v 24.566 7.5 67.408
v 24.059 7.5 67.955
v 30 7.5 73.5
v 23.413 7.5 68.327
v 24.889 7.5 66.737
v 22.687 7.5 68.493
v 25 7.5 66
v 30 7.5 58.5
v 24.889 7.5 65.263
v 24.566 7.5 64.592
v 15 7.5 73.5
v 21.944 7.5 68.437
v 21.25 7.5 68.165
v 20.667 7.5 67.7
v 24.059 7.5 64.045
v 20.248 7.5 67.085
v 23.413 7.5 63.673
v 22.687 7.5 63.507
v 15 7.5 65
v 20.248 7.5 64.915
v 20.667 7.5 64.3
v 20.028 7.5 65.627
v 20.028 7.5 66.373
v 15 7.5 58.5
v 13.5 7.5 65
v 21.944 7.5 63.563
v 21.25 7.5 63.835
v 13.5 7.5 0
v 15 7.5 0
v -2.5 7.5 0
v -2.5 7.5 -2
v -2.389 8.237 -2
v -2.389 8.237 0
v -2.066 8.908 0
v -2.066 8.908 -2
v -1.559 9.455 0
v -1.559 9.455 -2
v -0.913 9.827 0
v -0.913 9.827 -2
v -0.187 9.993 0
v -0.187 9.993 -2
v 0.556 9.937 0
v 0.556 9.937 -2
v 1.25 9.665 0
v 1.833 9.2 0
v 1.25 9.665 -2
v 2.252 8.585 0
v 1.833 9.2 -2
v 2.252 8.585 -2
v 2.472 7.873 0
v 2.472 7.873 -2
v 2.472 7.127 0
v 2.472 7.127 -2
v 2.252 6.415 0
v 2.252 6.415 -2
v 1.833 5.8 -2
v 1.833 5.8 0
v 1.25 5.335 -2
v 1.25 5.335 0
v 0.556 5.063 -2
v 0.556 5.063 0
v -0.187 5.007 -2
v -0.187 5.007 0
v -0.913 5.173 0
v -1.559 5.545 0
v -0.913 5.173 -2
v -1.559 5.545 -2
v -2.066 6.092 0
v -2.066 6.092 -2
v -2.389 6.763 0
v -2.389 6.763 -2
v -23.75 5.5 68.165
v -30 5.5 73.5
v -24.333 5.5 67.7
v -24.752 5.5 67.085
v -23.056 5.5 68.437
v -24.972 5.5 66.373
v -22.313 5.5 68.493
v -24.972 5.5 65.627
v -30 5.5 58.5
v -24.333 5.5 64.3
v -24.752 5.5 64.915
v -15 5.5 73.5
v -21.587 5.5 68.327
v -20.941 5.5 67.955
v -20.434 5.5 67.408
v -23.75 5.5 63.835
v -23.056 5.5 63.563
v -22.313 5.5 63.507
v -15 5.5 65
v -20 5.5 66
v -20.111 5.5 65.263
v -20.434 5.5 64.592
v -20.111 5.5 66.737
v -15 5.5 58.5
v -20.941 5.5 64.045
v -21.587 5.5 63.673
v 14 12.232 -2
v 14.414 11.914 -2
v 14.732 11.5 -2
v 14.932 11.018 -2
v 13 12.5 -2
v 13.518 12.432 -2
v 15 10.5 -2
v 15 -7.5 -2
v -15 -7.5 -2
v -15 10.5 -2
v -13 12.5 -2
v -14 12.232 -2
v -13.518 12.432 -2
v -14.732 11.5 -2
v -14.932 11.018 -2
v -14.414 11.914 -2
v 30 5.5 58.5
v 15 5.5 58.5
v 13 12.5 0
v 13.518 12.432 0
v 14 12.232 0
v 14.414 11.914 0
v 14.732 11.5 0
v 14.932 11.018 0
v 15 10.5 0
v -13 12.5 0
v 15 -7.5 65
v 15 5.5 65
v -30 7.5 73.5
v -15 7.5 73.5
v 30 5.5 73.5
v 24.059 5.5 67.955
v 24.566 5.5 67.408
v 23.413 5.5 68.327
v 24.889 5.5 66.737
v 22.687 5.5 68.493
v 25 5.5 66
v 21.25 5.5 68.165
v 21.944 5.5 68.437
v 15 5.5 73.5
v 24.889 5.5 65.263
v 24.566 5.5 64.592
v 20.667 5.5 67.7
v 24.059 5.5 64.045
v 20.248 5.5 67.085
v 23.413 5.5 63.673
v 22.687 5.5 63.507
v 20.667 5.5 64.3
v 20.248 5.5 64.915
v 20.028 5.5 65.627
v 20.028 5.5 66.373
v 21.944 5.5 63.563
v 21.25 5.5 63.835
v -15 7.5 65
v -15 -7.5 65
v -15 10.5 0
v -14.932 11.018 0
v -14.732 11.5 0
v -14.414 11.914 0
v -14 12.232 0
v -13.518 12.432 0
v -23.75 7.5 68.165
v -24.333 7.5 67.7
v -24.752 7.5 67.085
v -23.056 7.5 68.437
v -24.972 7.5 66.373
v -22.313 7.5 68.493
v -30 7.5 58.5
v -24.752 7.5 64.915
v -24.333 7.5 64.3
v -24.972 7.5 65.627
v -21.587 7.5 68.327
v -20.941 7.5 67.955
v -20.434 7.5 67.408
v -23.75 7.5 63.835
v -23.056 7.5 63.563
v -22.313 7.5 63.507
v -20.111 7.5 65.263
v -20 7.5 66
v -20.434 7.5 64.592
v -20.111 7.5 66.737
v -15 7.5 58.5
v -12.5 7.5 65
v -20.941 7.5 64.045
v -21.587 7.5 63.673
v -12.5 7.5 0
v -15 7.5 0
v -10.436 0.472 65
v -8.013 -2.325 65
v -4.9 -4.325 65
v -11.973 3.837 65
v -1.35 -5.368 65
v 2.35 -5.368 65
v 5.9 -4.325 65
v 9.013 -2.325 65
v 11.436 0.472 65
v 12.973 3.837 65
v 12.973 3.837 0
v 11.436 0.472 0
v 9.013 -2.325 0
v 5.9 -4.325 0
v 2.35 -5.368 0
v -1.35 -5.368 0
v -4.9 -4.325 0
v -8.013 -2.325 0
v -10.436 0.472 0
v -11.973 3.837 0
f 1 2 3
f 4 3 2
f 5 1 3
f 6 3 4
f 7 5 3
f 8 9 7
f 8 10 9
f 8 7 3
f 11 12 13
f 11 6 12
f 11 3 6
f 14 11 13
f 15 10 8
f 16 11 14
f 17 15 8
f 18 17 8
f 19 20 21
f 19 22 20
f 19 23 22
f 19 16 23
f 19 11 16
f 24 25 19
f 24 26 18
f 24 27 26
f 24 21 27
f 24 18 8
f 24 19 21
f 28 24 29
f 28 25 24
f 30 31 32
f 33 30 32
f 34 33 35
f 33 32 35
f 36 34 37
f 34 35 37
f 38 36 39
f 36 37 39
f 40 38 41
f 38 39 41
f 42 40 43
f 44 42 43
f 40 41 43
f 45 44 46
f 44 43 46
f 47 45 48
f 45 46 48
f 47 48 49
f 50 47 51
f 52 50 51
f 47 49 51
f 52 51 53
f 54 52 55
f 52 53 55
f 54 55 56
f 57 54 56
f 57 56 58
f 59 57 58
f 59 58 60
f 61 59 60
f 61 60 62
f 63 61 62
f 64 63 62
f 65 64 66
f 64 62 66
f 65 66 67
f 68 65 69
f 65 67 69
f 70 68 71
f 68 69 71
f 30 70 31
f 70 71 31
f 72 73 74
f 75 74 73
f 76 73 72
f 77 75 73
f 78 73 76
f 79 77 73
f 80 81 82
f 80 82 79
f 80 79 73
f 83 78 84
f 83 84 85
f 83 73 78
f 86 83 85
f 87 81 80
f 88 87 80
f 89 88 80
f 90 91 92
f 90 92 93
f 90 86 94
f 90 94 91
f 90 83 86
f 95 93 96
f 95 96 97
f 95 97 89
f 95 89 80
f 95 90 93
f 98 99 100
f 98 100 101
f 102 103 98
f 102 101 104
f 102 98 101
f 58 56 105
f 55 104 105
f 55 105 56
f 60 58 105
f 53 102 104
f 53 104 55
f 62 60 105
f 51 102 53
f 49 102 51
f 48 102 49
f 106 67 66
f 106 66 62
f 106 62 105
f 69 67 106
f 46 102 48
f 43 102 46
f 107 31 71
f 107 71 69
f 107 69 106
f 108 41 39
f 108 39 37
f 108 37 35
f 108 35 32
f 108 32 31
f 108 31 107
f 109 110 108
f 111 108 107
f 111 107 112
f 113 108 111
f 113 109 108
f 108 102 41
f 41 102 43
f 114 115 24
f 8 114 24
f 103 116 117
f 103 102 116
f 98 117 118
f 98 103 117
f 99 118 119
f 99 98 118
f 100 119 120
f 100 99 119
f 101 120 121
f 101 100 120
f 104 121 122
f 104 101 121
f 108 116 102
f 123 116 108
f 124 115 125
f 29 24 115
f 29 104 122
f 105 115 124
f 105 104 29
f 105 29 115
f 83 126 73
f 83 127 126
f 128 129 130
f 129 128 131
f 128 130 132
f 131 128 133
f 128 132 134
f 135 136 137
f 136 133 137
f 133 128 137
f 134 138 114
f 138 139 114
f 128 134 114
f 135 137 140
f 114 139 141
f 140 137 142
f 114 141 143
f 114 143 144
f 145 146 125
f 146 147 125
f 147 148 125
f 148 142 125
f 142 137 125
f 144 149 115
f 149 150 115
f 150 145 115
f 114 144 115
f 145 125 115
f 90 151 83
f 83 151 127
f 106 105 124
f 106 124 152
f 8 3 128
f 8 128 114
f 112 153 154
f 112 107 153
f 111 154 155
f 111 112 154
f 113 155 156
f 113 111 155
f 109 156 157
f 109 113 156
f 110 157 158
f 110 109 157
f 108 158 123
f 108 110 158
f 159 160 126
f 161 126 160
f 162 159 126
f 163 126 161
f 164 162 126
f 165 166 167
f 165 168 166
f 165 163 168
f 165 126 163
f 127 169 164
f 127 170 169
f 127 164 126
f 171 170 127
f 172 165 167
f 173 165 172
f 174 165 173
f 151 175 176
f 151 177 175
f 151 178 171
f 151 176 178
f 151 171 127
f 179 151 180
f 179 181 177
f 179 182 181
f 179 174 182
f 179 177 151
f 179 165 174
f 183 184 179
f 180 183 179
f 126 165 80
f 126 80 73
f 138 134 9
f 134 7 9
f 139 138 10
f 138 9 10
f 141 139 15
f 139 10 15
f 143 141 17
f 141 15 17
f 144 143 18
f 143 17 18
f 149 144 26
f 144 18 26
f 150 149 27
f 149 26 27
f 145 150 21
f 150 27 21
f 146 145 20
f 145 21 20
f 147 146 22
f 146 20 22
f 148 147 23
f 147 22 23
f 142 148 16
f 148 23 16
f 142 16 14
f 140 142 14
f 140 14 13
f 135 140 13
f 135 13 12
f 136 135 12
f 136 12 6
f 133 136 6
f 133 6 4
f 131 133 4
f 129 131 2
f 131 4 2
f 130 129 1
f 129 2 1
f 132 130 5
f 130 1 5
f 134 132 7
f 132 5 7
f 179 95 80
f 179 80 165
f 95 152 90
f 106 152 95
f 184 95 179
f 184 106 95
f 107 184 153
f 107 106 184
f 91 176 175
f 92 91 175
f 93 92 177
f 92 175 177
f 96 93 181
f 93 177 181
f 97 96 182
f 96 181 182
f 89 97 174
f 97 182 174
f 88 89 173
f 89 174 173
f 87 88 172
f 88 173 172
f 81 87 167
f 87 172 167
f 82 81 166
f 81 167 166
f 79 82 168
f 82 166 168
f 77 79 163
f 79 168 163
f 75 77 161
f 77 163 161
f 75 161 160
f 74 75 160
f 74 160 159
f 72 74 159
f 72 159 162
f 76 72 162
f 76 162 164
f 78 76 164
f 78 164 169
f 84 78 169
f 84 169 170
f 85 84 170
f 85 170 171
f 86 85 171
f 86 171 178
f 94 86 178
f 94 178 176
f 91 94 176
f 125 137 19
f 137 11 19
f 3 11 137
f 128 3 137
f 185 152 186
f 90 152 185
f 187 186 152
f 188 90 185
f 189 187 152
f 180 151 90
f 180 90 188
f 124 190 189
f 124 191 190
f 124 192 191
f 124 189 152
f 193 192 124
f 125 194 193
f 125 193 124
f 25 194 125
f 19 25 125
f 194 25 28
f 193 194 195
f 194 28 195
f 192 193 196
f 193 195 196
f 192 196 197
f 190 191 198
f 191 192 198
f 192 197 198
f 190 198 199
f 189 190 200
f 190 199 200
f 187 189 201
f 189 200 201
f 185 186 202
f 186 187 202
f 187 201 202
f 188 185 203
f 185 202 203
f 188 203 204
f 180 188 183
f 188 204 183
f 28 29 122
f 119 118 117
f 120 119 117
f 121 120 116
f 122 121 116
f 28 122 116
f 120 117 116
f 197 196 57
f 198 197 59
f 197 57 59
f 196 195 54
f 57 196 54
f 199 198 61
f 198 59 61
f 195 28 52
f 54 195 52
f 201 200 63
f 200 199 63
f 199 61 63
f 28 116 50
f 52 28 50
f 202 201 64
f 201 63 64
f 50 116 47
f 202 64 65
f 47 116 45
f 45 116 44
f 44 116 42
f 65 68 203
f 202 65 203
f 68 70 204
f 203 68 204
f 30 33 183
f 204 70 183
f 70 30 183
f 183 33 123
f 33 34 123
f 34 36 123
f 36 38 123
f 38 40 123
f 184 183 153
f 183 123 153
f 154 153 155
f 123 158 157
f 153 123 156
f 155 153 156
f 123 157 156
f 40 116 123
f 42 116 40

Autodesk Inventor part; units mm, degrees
ref_plane "YZ Plane" through (0, 0, 0) normal (1, 0, 0) x (0, 1, 0)
ref_plane "XZ Plane" through (0, 0, 0) normal (0, 1, 0) x (-1, 0, 0)
ref_plane "XY Plane" through (0, 0, 0) normal (0, 0, 1) x (1, 0, 0)
sketch "Skizze1" plane through (0, 0, 0) normal (0, 0, 1) x (1, 0, 0)
  line L0 (15, 7.5) -> (15, -7.5)
  line L1 (15, -7.5) -> (-15, -7.5)
  line L2 (-15, -7.5) -> (-15, 7.5)
  line L3 (-15, 7.5) -> (15, -7.5) construction
  line L4 (15, 7.5) -> (-15, -7.5) construction
  arc A0 (-12.5, 7.5) -> (13.5, 7.5) centre (0.5, 7.5) ccw
  line L5 (-15, 7.5) -> (-12.5, 7.5)
  line L6 (13.5, 7.5) -> (15, 7.5)
  point P0 (0, 0)
  dimension "d0" = 30
  dimension "d1" = 15
  dimension "d2" = 26
extrude "Extrusion1" add sketch "Skizze1" along normal blind 65
sketch "Skizze2" plane through (0, 0, 65) normal (0, 0, 1) x (1, 0, 0)
  line L0 (-15, 7.5) -> (-15, -7.5) projected
  line L1 (15, 7.5) -> (13.5, 7.5) projected
  line L2 (-15, -7.5) -> (15, -7.5)
  line L3 (15, -7.5) -> (15, 7.5)
  line L4 (-15, 7.5) -> (-15, -7.5)
  arc A0 (-12.5, 7.5) -> (13.5, 7.5) centre (0.5, 7.5) ccw projected
  arc A1 (0, -5.4904) -> (13.5, 7.5) centre (0.5, 7.5) ccw
  arc A2 (-12.5, 7.5) -> (0, -5.4904) centre (0.5, 7.5) ccw
  point P0 (0, 0)
extrude "Extrusion2" [suppressed]
sketch "Skizze3" plane through (0, 0, 67) normal (0, 0, 1) x (1, 0, 0)
  line L0 (-15, 7.5) -> (-15, -7.5) projected
  line L1 (-15, -7.5) -> (15.179, -7.5)
  line L2 (15.179, -7.5) -> (15.179, 7.5)
  line L3 (15.179, 7.5) -> (-15, 7.5)
  line L4 (-15, 7.5) -> (-15, -7.5)
  arc A0 (-12.9105, 7.5) -> (13.0895, 7.5) centre (0.0895, 7.5) ccw
  point P0 (0, 0)
  dimension "d7" = 26
extrude "Extrusion3" [suppressed]
sketch "Skizze4" plane through (0, 0, 132) normal (0, 0, 1) x (1, 0, 0)
  line L0 (-15, 7.5) -> (-15, -7.5) projected
  line L1 (-15, -7.5) -> (15, -7.5)
  line L2 (15, -7.5) -> (15, 12.5)
  line L3 (15, 12.5) -> (-15, 12.5)
  line L4 (-15, 12.5) -> (-15, -7.5)
  point P0 (0, 0)
  dimension "d10" = 30
  dimension "d11" = 20
extrude "Extrusion4" [suppressed]
sketch "Skizze5" plane through (0, 0, 134) normal (0, 0, 1) x (1, 0, 0)
  circle A0 centre (0, 7.5) radius 2.5
  point P0 (0, 0)
  dimension "d14" = 5
extrude "Extrusion5" [suppressed]
sketch "Skizze6" plane through (0, 0, 0) normal (0, 0, -1) x (-1, 0, 0)
  line L0 (-15.179, -7.5) -> (-15, -7.5) projected
  line L1 (-15, 12.5) -> (15, 12.5) projected
  line L2 (-15, -7.5) -> (15, -7.5)
  line L3 (15, -7.5) -> (15, 12.5)
  line L4 (15, 12.5) -> (-15, 12.5)
  line L5 (-15, 12.5) -> (-15, -7.5)
  point P0 (0, 0)
  point P1 (-14.9426, -7.5)
extrude "Extrusion6" add sketch "Skizze6" along normal blind 2
sketch "Skizze7" plane through (0, 0, -2) normal (0, 0, -1) x (-1, 0, 0)
  line L0 (-13.0895, 7.5) -> (12.9105, 7.5) projected
  circle A0 centre (0, 7.5) radius 2.5
  point P0 (0, 0)
  dimension "d19" = 5
extrude "Extrusion7" cut sketch "Skizze7" against normal blind 2
fillet "Rundung1" radius 2 1 edges at (-15, 12.5, -1)
fillet "Rundung2" [suppressed]
fillet "Rundung3" [suppressed]
fillet "Rundung4" radius 2 1 edges at (15, 12.5, -1)
sketch "Skizze8" plane through (-15, -7.5, -2) normal (-1, 0, 0) x (0, 0, 1)
  line L0 (69, 0) -> (69, 15) projected
  line L1 (69, 15) -> (68, 15)
  line L2 (75.5, 13) -> (60.5, 13)
  line L3 (60.5, 13) -> (60.5, 15)
  line L4 (75.5, 15) -> (75.5, 13)
  line L5 (75.5, 13) -> (60.5, 17) construction
  line L6 (60.5, 13) -> (68, 15) construction
  line L7 (2, 15) -> (67, 15) projected
  line L8 (60.5, 15) -> (75.5, 15)
  point P0 (2, 7.5)
  dimension "d26" = 1
  dimension "d28" = 4
extrude "Extrusion8" add sketch "Skizze8" along normal blind 15
sketch "Skizze9" plane through (-12.5, 7.5, 65) normal (0, 1, 0) x (1, 0, 0)
  line L0 (-2.5, 6.5) -> (-17.5, 6.5) projected
  line L1 (-2.5, 67) -> (-2.5, 0) projected
  line L2 (-17.5, 6.5) -> (3.7132, 6.5) construction
  circle A0 centre (-10, -1) radius 2.5
  point P0 (12.5, 65)
  point P1 (-2.5, -69)
  dimension "d32" = 5
extrude "Extrusion9" cut sketch "Skizze9" against normal through all
sketch "Skizze10" plane through (15, -7.5, 67) normal (1, 0, 0) x (0, 0, -1)
  line L0 (0, 15) -> (1, 15)
  line L1 (67, 15) -> (2, 15) projected
  line L2 (8.5, 17) -> (-6.5, 17)
  line L3 (-6.5, 15) -> (-6.5, 13)
  line L4 (-6.5, 13) -> (8.5, 13)
  line L5 (8.5, 13) -> (8.5, 15)
  line L6 (1, 15) -> (-6.5, 13) construction
  line L7 (1, 15) -> (8.5, 13) construction
  line L8 (0, 15) -> (-65, 15) projected
  line L9 (-6.5, 15) -> (8.5, 15)
  point P0 (67, 7.5)
  point P1 (8.5, 15)
  point P2 (1, 15)
  dimension "d35" = 1
  dimension "d37" = 4
extrude "Extrusion10" add sketch "Skizze10" along normal blind 15
sketch "Skizze11" plane through (-12.5, 7.5, 65) normal (0, 1, 0) x (1, 0, 0)
  line L0 (27.679, -8.5) -> (27.679, -67) projected
  line L1 (42.5, -8.5) -> (42.5, 6.5) projected
  line L2 (27.679, -8.5) -> (48.6391, -8.5) construction
  line L3 (27.5, 6.5) -> (27.5, 0) projected
  circle A0 centre (35, -1) radius 2.5
  point P0 (12.5, 65)
  point P1 (27.5, -2)
  dimension "d41" = 5
extrude "Extrusion11" cut sketch "Skizze11" against normal through all
properties part number "Motorhalterung"
